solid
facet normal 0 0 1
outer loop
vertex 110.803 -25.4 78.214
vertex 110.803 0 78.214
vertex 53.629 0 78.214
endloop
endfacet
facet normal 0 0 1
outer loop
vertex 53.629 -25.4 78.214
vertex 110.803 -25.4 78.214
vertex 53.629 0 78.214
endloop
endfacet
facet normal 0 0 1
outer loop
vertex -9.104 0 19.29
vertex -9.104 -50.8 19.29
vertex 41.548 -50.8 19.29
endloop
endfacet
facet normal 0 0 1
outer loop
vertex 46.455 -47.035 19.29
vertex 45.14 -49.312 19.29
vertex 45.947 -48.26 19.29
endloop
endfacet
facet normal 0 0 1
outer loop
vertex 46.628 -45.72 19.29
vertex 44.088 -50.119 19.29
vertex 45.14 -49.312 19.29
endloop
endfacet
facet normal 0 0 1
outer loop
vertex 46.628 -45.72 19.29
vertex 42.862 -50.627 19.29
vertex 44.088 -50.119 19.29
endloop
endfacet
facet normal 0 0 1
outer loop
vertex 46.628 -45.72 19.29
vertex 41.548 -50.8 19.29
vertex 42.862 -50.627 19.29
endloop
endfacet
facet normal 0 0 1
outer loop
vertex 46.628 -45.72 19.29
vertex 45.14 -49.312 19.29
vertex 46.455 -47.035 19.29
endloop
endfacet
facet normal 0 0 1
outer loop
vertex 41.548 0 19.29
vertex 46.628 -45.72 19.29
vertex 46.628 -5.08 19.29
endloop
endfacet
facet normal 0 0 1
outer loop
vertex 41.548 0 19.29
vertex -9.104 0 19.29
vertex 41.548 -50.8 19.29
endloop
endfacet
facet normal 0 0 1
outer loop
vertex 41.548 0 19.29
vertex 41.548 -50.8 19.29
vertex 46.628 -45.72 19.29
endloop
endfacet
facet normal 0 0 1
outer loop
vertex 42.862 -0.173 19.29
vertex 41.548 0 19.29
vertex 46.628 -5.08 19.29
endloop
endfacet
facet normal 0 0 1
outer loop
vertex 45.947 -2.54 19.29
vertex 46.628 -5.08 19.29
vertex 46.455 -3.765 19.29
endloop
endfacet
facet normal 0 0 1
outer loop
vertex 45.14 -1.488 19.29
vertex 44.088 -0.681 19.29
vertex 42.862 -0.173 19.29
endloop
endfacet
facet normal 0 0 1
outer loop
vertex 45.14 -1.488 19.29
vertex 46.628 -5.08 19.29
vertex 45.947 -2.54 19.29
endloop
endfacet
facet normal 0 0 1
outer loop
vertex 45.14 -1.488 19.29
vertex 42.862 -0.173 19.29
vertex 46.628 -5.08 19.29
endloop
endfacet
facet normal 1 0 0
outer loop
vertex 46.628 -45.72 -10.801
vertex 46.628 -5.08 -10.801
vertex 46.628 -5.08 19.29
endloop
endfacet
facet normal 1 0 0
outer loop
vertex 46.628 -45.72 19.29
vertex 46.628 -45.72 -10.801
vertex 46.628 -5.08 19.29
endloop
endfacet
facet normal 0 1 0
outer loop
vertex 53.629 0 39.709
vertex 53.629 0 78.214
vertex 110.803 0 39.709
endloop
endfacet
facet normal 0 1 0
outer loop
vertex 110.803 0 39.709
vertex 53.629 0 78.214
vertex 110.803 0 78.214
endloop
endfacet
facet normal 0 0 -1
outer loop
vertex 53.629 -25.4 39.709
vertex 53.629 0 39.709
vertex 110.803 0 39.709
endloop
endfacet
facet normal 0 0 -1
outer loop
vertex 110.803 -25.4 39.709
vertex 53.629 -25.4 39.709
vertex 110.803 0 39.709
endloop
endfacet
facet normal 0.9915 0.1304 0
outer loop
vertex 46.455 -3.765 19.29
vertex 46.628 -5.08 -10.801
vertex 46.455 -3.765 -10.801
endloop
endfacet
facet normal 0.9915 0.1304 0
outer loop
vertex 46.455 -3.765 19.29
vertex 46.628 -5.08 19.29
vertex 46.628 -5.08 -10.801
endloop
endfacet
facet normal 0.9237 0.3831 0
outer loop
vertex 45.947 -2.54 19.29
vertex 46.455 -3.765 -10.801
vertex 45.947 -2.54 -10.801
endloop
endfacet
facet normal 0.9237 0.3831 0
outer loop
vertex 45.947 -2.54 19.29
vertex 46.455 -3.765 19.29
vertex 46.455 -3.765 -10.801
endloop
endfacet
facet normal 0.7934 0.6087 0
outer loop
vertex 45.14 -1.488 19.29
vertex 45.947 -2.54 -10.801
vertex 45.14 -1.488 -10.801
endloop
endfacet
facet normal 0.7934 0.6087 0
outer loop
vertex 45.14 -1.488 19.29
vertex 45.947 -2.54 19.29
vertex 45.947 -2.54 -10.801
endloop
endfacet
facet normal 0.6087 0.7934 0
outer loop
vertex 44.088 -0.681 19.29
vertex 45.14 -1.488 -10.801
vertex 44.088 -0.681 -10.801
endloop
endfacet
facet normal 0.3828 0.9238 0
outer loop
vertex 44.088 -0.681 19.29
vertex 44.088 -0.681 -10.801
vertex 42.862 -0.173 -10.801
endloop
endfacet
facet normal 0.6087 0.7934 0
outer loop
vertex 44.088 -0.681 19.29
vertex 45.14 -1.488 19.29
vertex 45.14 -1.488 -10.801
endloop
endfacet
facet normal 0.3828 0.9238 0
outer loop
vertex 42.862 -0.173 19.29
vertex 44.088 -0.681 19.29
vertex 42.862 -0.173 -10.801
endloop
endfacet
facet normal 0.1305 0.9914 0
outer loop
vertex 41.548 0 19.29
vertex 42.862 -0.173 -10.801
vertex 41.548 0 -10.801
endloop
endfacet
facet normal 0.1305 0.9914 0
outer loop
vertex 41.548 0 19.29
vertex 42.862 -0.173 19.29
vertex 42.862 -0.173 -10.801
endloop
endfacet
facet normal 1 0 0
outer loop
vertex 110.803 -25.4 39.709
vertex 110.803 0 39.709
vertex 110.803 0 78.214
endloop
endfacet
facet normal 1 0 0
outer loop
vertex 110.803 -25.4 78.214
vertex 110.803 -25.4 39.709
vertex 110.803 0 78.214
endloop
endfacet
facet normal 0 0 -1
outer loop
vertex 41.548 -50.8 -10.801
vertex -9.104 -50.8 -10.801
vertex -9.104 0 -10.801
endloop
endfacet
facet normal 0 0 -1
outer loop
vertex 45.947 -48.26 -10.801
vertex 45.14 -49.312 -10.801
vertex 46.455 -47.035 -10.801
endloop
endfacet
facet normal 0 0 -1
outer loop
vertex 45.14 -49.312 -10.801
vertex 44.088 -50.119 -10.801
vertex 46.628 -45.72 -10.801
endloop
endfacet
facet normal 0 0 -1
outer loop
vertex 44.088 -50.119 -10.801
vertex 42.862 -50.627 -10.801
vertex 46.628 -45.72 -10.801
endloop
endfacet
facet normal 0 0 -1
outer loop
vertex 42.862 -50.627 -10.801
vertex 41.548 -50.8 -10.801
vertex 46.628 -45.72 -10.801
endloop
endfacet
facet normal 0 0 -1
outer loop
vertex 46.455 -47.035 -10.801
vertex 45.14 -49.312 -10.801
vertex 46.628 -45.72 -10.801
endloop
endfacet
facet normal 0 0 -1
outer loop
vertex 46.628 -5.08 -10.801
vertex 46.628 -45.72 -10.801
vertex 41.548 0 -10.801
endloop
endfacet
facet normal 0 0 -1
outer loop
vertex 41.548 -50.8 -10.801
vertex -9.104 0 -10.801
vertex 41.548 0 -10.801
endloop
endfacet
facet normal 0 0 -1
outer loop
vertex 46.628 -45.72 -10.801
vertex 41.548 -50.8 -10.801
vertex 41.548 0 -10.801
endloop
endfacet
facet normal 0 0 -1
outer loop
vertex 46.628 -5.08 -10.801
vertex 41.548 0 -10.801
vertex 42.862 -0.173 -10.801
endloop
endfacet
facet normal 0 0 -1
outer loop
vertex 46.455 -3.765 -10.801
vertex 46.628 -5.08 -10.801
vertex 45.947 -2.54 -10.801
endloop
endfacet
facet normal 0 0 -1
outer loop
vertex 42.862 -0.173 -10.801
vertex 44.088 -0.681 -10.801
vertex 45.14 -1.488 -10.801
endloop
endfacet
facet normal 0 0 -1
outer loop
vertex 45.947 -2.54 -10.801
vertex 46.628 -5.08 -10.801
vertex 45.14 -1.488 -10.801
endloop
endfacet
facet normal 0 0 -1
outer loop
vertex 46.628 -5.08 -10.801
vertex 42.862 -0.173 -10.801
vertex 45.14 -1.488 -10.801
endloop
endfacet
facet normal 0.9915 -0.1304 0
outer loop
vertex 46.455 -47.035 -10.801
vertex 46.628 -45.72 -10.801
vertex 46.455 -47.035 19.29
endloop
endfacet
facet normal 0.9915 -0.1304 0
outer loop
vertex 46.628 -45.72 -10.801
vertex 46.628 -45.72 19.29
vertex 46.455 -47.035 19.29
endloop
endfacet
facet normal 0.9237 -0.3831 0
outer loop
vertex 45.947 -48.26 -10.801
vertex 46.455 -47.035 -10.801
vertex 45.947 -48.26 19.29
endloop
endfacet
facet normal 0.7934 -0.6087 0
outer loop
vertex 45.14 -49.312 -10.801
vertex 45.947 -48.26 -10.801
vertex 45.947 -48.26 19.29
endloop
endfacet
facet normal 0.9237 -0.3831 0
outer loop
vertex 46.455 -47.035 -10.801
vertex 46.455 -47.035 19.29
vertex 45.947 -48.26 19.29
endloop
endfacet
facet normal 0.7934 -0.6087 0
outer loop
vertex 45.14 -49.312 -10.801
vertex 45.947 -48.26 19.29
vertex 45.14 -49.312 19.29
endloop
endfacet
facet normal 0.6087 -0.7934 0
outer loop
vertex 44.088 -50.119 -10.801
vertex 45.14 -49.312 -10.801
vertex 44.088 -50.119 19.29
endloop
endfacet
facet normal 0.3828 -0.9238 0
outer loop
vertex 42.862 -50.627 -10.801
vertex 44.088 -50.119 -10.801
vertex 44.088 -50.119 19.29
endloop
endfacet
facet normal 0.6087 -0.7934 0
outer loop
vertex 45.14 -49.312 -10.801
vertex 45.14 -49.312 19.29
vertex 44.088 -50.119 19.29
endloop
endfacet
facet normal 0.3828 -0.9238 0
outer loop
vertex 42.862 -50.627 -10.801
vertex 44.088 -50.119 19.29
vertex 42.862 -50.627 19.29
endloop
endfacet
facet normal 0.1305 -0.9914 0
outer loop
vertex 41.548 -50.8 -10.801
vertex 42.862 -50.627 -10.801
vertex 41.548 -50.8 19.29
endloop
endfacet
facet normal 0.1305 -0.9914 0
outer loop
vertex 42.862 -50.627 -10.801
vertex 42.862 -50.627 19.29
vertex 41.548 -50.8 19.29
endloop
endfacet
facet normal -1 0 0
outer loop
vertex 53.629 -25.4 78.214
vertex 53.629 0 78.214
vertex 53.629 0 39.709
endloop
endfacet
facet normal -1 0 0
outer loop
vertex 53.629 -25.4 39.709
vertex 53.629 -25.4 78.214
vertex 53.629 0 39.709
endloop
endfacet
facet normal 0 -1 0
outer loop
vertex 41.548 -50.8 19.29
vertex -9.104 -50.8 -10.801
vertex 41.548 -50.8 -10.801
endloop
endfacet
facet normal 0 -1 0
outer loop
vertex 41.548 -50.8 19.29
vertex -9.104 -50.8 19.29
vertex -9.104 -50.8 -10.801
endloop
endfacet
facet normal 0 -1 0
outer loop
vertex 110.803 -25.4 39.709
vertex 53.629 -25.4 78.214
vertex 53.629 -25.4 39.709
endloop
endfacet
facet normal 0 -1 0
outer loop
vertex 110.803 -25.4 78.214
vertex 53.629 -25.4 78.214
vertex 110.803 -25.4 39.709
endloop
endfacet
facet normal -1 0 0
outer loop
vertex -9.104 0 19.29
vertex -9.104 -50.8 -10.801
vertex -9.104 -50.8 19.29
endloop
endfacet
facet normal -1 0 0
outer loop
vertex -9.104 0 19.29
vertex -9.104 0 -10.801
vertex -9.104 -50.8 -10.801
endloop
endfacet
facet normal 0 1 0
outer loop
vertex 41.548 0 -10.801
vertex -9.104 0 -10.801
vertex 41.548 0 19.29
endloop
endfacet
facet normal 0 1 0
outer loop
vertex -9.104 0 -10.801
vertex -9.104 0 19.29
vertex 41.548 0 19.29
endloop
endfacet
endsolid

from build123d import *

# Parameters (mm, degrees)
F0_W     = 55.7312387973
F0_H     = 30.0914160907
F1_DEPTH = 25.4
F2_DEPTH = 25.4
F3_R     = 5.08


with BuildPart() as f1:
    # F0 (on Front) → F1 (new body)
    with BuildSketch(Plane.XZ):
        with Locations((18.7620026991, 4.2443163693)):
            Rectangle(F0_W, F0_H)
    extrude(amount=F1_DEPTH)

    # F2 (add): a face of the model
    f2_faces = [f1.faces().sort_by_distance(p)[0] for p in [
        (18.7620026991, -25.4, 4.2443163693),
    ]]
    extrude(f2_faces, amount=F2_DEPTH)

    # F3
    f3_edges = [f1.edges().sort_by_distance(p)[0] for p in [
        (46.627622, -50.8, 4.244316),
        (46.627622, 0, 4.244316),
    ]]
    fillet(f3_edges, radius=F3_R)


with BuildPart() as f1b:
    # F0 (on Front) → F1, piece 2 (new body)
    with BuildSketch(Plane.XZ):
        Polygon((53.6285489798, 78.2144851983), (53.6285489798, 54.7660994999), (53.6285489798, 39.709392935), (110.8027845621, 39.709392935), (110.8027845621, 78.2144851983), align=None)
    extrude(amount=F1_DEPTH)


solid = Compound([f1.part, f1b.part])
